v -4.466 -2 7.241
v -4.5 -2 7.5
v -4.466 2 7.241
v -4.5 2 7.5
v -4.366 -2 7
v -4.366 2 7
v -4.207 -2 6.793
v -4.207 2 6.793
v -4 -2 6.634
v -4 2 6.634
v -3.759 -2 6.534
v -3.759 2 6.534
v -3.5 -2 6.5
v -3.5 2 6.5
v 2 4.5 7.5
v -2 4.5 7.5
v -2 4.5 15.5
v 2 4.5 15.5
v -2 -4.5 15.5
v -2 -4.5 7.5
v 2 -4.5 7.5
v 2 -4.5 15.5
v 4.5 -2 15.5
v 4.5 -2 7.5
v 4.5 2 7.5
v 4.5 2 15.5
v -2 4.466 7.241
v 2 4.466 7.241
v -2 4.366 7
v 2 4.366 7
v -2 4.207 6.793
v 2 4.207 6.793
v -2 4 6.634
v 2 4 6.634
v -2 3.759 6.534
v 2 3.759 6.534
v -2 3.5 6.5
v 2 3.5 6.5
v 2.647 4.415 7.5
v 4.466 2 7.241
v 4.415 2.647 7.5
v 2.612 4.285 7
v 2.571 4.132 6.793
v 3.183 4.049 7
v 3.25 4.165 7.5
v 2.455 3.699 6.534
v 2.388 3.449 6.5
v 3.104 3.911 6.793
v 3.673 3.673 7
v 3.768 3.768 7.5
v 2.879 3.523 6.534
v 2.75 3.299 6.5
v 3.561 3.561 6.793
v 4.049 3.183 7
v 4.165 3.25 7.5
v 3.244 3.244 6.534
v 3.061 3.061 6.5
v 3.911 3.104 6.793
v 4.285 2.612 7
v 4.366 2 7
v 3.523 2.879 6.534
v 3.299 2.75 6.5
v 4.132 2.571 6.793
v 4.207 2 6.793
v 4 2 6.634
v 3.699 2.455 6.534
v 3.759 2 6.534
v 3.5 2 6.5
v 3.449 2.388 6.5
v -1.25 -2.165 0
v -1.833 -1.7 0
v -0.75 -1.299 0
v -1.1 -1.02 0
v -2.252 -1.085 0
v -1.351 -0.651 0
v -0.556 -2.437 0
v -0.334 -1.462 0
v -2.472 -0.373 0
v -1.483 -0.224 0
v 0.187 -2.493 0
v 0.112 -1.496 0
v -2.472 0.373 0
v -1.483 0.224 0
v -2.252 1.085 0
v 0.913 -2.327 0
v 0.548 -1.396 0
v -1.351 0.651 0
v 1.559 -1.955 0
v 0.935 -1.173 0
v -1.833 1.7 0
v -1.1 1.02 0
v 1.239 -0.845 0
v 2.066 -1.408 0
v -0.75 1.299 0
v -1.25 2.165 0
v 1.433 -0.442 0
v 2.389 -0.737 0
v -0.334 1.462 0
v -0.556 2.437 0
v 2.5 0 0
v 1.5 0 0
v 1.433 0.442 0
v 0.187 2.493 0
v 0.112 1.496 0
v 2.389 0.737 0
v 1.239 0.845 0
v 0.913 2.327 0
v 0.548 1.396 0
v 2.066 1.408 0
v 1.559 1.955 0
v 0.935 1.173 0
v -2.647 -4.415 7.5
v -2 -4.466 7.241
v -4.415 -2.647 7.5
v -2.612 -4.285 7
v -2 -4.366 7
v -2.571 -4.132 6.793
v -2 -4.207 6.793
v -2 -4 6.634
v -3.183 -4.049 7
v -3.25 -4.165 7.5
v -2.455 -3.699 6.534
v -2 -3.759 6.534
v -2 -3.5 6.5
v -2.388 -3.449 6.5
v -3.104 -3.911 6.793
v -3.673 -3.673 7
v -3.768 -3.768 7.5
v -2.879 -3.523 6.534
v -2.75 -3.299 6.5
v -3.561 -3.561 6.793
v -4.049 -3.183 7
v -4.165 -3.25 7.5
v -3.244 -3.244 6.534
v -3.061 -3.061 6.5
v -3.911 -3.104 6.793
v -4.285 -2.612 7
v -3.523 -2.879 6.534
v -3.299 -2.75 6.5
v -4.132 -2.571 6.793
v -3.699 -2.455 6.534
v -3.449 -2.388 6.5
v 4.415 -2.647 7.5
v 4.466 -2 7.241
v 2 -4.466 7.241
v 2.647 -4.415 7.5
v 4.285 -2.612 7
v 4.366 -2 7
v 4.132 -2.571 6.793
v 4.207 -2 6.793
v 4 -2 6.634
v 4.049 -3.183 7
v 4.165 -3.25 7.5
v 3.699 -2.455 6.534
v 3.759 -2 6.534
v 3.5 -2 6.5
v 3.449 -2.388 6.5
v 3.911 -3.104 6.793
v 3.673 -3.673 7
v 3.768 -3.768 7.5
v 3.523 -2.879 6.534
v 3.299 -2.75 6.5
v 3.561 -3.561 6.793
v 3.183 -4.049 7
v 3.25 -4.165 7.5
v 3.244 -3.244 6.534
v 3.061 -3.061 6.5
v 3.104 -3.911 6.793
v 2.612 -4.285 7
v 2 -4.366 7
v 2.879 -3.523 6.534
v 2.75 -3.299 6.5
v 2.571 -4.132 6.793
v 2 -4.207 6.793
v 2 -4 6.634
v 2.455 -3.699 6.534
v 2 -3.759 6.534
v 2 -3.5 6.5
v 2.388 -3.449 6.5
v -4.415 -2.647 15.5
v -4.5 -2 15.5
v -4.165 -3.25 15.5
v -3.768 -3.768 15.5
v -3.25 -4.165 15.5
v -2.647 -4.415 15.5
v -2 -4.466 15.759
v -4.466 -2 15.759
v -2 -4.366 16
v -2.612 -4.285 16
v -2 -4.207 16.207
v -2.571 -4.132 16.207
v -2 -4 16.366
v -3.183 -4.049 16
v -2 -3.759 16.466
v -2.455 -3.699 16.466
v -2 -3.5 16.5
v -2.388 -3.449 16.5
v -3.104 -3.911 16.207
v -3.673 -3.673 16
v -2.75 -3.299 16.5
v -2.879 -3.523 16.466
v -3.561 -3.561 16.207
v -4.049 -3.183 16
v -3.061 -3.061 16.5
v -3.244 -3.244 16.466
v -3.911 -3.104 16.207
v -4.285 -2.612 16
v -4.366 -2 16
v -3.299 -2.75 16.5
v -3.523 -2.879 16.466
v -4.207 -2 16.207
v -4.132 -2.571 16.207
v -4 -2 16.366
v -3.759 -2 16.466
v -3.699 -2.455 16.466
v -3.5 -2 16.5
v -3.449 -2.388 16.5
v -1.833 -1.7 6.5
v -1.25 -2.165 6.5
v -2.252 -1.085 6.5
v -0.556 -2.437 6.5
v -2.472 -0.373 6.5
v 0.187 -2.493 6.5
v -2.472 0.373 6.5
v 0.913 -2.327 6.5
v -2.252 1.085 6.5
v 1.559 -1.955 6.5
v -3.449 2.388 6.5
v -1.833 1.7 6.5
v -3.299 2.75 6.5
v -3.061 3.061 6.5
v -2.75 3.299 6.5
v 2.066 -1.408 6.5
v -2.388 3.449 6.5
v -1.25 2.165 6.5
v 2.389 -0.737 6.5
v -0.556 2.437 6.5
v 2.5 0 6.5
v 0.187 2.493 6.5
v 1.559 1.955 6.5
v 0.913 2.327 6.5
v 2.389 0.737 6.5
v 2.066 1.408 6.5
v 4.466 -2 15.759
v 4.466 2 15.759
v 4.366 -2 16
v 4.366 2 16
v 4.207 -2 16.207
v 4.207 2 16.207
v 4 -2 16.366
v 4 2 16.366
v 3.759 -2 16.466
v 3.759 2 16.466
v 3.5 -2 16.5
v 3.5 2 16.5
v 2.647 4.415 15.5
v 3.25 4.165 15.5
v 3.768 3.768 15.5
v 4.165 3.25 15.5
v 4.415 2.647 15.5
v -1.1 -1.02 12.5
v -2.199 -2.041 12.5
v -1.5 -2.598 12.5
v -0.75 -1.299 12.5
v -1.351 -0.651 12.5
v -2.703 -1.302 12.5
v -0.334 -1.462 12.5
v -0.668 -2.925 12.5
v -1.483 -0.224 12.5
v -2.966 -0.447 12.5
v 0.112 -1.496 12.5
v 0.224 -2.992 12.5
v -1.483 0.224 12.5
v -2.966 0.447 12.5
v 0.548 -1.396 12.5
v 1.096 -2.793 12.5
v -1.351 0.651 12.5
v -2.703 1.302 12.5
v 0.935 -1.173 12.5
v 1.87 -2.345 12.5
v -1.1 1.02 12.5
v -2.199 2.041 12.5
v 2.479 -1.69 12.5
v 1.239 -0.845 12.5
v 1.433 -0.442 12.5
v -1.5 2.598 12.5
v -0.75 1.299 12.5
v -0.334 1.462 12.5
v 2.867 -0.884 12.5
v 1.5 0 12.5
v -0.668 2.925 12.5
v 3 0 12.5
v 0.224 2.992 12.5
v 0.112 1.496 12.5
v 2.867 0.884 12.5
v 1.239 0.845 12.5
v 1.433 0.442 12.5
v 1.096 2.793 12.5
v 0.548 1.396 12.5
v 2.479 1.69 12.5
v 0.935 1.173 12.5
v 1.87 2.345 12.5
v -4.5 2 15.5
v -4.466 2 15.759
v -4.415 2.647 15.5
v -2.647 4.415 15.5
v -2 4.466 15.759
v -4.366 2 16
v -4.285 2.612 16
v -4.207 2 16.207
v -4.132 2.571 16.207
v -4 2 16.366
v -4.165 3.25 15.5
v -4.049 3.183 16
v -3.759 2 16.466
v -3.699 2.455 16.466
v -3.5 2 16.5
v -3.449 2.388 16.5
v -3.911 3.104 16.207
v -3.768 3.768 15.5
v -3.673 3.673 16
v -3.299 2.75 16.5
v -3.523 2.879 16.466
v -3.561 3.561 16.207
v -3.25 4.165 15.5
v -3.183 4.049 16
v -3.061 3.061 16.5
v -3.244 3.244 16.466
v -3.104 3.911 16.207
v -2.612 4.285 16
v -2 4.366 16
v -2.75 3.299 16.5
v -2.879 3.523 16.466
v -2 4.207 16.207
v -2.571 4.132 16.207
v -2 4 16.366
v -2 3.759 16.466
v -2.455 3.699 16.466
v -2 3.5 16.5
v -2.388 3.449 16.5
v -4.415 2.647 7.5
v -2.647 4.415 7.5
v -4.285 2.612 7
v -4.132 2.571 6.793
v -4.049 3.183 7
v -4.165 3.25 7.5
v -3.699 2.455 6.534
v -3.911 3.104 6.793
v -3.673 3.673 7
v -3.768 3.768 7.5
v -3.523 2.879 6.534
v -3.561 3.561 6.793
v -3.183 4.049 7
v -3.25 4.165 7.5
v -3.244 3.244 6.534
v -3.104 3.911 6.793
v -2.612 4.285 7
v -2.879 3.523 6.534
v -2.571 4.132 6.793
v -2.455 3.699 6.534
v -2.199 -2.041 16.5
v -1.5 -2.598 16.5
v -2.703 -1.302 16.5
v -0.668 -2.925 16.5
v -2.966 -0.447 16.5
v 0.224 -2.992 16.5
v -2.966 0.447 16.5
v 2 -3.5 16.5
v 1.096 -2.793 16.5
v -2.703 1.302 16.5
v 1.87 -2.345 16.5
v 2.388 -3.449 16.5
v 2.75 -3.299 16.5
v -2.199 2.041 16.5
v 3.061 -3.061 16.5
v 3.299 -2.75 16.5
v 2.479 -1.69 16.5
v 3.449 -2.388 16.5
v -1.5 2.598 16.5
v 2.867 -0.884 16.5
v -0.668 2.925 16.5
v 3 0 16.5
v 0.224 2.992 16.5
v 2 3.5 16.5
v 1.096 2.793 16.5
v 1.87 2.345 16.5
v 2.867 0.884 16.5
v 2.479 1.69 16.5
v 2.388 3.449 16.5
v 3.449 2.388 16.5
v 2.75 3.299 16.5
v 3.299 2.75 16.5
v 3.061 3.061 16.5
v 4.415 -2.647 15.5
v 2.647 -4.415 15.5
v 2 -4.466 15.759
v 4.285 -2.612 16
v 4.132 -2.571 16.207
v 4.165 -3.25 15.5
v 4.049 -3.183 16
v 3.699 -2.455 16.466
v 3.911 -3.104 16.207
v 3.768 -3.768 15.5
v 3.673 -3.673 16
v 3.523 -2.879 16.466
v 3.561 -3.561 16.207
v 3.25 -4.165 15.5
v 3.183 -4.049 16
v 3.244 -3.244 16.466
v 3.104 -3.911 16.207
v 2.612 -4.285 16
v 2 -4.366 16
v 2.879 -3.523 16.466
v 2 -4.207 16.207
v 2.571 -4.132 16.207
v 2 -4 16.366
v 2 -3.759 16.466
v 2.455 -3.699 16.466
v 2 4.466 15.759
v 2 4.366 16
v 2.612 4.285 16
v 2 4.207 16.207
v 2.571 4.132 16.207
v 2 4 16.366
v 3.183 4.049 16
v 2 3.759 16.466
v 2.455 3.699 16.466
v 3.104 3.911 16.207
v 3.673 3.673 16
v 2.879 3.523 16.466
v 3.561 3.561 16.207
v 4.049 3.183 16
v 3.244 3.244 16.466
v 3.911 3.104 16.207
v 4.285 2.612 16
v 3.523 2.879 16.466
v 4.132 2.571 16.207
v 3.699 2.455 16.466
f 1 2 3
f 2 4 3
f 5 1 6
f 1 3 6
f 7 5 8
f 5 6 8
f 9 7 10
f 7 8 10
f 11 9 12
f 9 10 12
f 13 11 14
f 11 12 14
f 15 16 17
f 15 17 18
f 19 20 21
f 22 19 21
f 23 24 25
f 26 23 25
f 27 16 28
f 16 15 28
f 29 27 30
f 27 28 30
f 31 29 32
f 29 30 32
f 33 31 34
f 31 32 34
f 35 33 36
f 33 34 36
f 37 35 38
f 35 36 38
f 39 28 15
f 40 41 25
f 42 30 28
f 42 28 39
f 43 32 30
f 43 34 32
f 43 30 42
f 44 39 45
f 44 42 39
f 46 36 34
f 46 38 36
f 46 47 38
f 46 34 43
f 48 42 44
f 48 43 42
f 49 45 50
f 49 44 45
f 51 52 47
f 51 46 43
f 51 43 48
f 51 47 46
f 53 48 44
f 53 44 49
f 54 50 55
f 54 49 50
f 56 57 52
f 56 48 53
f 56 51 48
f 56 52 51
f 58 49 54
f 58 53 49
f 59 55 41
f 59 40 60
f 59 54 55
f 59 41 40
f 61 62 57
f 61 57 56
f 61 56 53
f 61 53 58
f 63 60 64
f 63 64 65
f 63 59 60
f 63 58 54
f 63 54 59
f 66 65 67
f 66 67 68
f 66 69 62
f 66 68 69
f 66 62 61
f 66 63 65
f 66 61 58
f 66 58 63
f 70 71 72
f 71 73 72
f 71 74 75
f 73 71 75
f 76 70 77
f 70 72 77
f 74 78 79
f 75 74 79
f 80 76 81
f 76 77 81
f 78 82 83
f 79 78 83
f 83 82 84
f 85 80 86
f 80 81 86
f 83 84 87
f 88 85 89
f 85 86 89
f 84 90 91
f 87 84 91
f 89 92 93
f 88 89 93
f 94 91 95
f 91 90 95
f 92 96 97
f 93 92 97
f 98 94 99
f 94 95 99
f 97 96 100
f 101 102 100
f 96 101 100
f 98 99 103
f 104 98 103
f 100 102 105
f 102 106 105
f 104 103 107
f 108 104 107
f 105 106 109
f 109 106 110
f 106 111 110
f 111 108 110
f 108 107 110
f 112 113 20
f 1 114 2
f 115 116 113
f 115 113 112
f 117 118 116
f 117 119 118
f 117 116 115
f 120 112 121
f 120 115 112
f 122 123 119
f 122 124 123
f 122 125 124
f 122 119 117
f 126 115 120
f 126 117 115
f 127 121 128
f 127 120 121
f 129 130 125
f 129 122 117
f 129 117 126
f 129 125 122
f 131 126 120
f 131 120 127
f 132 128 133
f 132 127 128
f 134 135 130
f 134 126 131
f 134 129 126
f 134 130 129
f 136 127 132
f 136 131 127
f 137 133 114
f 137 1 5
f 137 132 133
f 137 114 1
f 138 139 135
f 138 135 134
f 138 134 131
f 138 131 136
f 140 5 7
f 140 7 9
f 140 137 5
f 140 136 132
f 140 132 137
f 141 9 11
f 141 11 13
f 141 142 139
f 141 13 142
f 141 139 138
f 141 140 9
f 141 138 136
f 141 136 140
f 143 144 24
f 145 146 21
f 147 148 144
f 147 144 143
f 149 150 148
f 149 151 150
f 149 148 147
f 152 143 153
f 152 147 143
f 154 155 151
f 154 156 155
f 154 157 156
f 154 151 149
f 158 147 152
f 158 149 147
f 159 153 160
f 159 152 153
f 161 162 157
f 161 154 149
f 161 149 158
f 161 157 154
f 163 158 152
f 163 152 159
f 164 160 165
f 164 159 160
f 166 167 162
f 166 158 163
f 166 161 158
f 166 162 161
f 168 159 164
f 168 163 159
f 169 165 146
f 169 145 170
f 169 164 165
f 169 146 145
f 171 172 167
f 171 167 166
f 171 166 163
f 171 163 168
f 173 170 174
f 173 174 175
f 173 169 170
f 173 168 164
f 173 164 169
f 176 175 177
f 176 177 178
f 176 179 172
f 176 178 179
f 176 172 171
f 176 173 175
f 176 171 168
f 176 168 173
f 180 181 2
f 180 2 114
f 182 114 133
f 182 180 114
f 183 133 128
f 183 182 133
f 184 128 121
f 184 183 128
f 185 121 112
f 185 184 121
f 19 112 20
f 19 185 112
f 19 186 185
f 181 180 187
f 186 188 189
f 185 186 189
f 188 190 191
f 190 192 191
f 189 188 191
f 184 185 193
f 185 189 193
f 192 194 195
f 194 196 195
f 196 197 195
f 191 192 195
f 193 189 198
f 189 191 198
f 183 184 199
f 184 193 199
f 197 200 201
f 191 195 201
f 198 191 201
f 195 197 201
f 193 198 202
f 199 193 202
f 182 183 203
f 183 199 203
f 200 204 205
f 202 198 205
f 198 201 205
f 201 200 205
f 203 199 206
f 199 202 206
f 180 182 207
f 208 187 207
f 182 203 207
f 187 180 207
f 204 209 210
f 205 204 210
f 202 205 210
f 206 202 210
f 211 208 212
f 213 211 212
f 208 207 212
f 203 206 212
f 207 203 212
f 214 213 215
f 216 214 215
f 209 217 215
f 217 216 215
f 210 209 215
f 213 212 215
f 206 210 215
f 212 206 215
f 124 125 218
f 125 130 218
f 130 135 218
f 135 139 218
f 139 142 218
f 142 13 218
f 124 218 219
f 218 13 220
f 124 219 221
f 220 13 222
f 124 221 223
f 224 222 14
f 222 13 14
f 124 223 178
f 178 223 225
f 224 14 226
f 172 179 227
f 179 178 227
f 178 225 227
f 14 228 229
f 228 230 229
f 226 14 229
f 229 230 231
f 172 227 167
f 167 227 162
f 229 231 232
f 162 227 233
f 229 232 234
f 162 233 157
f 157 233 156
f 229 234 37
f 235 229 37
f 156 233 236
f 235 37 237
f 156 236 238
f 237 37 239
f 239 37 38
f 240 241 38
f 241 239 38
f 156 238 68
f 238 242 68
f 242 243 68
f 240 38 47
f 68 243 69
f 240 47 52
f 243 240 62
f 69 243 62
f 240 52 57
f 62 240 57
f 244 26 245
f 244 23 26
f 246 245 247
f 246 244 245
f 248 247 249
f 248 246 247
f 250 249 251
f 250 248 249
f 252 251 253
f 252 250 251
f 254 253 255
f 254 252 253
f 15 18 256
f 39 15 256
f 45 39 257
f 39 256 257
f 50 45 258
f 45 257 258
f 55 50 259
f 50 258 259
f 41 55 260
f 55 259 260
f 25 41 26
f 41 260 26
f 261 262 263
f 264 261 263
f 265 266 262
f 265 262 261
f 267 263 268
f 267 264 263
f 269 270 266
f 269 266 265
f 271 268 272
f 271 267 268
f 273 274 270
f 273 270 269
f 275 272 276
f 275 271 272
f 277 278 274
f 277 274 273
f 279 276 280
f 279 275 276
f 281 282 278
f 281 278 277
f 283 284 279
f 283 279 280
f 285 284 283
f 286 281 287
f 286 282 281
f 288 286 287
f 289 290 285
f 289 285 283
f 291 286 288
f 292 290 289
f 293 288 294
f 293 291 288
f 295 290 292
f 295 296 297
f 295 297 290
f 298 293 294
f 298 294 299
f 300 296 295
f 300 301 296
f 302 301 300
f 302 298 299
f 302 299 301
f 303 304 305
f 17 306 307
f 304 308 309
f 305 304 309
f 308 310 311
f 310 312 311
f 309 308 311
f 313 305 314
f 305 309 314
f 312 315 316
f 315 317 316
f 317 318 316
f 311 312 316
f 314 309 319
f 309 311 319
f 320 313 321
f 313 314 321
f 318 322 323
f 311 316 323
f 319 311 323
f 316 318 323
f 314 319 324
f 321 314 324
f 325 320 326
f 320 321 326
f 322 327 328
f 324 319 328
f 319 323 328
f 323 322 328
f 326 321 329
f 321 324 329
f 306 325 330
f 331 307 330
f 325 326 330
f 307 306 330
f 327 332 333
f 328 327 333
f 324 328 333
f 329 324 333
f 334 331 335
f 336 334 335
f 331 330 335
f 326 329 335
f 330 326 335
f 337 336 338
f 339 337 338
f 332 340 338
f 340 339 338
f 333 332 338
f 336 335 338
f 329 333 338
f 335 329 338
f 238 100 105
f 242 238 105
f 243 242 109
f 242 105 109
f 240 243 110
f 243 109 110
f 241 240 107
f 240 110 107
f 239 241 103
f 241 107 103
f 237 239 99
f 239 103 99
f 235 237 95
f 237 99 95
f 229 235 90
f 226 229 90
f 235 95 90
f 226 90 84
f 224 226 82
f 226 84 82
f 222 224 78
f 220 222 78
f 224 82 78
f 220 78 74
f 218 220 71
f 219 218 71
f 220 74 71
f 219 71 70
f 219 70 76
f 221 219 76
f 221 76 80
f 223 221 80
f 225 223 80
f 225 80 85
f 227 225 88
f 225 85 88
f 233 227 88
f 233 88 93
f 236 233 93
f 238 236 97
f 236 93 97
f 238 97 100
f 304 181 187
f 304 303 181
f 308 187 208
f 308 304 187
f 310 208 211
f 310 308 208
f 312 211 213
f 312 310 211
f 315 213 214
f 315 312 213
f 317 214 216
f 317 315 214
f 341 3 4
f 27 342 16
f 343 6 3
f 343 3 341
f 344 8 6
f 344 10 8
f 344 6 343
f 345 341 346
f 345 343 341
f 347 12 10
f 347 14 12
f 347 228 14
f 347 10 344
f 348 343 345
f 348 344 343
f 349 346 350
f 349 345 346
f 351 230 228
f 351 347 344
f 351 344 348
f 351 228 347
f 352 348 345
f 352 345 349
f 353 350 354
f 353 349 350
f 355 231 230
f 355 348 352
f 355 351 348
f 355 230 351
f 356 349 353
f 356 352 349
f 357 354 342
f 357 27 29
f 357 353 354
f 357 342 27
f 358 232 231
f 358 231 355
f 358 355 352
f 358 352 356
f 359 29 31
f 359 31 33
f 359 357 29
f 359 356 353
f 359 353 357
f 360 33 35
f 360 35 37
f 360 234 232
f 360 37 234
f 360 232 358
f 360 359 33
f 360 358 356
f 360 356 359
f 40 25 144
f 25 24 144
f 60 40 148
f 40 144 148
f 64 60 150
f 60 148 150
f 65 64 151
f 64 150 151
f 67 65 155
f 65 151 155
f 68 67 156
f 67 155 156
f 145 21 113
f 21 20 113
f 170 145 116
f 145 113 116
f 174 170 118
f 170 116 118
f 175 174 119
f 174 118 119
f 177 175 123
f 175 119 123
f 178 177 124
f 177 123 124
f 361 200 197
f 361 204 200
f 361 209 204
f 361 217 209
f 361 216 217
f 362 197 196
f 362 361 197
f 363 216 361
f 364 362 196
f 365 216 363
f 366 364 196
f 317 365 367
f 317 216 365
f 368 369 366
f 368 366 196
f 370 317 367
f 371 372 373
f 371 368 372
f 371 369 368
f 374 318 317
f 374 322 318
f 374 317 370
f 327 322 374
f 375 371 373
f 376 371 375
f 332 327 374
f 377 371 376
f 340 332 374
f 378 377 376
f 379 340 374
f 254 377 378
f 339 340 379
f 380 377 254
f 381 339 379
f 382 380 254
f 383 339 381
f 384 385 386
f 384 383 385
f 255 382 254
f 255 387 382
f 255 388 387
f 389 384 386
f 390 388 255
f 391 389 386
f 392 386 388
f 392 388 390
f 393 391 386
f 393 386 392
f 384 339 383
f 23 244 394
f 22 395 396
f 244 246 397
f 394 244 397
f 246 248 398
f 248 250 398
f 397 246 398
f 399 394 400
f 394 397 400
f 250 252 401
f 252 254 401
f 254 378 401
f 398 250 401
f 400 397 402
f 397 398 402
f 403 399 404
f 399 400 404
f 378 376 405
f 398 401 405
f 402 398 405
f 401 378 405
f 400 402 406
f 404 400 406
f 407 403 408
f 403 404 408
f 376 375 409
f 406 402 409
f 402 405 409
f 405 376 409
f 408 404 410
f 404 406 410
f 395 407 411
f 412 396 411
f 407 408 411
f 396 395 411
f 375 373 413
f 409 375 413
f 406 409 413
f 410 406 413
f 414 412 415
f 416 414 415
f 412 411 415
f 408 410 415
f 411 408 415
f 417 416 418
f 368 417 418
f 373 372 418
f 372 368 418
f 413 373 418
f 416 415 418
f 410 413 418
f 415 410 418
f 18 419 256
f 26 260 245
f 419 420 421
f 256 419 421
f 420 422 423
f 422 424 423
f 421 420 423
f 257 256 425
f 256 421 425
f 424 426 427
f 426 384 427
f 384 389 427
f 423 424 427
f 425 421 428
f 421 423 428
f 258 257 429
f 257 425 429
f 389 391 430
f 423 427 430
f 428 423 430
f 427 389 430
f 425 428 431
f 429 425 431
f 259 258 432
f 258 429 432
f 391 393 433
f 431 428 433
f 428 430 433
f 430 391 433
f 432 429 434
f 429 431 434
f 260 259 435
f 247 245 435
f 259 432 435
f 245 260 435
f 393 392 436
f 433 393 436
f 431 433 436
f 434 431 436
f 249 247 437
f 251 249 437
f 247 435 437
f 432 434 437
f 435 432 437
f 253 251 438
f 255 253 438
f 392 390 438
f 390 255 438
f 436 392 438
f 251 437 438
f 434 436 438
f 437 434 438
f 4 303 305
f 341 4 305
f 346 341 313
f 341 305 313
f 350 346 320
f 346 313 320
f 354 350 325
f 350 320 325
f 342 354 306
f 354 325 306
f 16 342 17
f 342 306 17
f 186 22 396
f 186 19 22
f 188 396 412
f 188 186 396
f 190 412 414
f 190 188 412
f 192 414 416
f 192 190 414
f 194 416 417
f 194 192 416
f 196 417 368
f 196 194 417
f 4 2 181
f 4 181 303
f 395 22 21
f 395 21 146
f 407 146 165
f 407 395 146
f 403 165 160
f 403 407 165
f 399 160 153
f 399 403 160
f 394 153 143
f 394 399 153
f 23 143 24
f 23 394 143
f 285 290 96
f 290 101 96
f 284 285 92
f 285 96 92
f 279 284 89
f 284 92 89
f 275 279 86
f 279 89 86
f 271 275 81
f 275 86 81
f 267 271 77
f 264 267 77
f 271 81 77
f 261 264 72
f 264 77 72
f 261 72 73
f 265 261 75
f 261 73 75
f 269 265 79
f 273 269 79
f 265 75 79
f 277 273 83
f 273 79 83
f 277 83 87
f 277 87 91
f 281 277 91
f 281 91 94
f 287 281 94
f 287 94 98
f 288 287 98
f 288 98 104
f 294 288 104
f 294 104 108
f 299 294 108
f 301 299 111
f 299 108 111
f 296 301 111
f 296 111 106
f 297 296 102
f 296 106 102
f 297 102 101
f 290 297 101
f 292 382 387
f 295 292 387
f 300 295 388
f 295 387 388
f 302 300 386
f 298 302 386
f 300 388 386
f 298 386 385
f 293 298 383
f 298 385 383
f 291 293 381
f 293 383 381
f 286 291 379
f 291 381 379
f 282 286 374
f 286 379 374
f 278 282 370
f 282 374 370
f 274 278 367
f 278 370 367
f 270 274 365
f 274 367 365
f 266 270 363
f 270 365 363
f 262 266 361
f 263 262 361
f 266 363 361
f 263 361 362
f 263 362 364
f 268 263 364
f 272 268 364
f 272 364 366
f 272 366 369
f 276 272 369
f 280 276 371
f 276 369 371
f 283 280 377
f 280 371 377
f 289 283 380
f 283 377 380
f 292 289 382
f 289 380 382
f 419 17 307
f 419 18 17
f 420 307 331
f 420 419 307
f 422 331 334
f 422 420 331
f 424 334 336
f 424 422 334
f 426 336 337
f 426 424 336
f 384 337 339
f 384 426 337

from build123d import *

# Parameters (mm, degrees)
F0_R      = 2.5
F0_R_2    = 1.5
F1_DEPTH  = 6.5
F2_W      = 9
F2_H      = 9
F3_DEPTH  = 10
F4_R      = 2.5
F5_R      = 1
F3_FACE_R = 1.5
F6_DEPTH  = 10
F7_R      = 3
F8_DEPTH  = 4


with BuildPart() as f1:
    # F0 (on Top) → F1 (new body)
    with BuildSketch(Plane.XY):
        Circle(F0_R)
        Circle(F0_R_2, mode=Mode.SUBTRACT)
    extrude(amount=F1_DEPTH)

    # F2 (on face) → F3 (join)
    with BuildSketch(Plane.XY.offset(6.5)):
        Rectangle(F2_W, F2_H)
    extrude(amount=F3_DEPTH)

    # F4
    f4_edges = [f1.edges().sort_by_distance(p)[0] for p in [
        (-4.5, -4.5, 11.5),
        (4.5, -4.5, 11.5),
        (4.5, 4.5, 11.5),
        (-4.5, 4.5, 11.5),
    ]]
    fillet(f4_edges, radius=F4_R)

    # F5
    f5_edges = [f1.edges().sort_by_distance(p)[0] for p in [
        (-4.5, 0, 6.5),
        (-4.5, 0, 16.5),
    ]]
    fillet(f5_edges, radius=F5_R)

    # F3_face (on face) → F6 (cut)
    with BuildSketch(Plane(origin=(0, 0, 6.5), x_dir=(1, 0, 0), z_dir=(0, 0, -1))):
        Circle(F3_FACE_R)
    extrude(amount=-F6_DEPTH, mode=Mode.SUBTRACT)

    # F7 (on face) → F8 (cut)
    with BuildSketch(Plane.XY.offset(16.5)):
        Circle(F7_R)
    extrude(amount=-F8_DEPTH, mode=Mode.SUBTRACT)


solid = f1.part
